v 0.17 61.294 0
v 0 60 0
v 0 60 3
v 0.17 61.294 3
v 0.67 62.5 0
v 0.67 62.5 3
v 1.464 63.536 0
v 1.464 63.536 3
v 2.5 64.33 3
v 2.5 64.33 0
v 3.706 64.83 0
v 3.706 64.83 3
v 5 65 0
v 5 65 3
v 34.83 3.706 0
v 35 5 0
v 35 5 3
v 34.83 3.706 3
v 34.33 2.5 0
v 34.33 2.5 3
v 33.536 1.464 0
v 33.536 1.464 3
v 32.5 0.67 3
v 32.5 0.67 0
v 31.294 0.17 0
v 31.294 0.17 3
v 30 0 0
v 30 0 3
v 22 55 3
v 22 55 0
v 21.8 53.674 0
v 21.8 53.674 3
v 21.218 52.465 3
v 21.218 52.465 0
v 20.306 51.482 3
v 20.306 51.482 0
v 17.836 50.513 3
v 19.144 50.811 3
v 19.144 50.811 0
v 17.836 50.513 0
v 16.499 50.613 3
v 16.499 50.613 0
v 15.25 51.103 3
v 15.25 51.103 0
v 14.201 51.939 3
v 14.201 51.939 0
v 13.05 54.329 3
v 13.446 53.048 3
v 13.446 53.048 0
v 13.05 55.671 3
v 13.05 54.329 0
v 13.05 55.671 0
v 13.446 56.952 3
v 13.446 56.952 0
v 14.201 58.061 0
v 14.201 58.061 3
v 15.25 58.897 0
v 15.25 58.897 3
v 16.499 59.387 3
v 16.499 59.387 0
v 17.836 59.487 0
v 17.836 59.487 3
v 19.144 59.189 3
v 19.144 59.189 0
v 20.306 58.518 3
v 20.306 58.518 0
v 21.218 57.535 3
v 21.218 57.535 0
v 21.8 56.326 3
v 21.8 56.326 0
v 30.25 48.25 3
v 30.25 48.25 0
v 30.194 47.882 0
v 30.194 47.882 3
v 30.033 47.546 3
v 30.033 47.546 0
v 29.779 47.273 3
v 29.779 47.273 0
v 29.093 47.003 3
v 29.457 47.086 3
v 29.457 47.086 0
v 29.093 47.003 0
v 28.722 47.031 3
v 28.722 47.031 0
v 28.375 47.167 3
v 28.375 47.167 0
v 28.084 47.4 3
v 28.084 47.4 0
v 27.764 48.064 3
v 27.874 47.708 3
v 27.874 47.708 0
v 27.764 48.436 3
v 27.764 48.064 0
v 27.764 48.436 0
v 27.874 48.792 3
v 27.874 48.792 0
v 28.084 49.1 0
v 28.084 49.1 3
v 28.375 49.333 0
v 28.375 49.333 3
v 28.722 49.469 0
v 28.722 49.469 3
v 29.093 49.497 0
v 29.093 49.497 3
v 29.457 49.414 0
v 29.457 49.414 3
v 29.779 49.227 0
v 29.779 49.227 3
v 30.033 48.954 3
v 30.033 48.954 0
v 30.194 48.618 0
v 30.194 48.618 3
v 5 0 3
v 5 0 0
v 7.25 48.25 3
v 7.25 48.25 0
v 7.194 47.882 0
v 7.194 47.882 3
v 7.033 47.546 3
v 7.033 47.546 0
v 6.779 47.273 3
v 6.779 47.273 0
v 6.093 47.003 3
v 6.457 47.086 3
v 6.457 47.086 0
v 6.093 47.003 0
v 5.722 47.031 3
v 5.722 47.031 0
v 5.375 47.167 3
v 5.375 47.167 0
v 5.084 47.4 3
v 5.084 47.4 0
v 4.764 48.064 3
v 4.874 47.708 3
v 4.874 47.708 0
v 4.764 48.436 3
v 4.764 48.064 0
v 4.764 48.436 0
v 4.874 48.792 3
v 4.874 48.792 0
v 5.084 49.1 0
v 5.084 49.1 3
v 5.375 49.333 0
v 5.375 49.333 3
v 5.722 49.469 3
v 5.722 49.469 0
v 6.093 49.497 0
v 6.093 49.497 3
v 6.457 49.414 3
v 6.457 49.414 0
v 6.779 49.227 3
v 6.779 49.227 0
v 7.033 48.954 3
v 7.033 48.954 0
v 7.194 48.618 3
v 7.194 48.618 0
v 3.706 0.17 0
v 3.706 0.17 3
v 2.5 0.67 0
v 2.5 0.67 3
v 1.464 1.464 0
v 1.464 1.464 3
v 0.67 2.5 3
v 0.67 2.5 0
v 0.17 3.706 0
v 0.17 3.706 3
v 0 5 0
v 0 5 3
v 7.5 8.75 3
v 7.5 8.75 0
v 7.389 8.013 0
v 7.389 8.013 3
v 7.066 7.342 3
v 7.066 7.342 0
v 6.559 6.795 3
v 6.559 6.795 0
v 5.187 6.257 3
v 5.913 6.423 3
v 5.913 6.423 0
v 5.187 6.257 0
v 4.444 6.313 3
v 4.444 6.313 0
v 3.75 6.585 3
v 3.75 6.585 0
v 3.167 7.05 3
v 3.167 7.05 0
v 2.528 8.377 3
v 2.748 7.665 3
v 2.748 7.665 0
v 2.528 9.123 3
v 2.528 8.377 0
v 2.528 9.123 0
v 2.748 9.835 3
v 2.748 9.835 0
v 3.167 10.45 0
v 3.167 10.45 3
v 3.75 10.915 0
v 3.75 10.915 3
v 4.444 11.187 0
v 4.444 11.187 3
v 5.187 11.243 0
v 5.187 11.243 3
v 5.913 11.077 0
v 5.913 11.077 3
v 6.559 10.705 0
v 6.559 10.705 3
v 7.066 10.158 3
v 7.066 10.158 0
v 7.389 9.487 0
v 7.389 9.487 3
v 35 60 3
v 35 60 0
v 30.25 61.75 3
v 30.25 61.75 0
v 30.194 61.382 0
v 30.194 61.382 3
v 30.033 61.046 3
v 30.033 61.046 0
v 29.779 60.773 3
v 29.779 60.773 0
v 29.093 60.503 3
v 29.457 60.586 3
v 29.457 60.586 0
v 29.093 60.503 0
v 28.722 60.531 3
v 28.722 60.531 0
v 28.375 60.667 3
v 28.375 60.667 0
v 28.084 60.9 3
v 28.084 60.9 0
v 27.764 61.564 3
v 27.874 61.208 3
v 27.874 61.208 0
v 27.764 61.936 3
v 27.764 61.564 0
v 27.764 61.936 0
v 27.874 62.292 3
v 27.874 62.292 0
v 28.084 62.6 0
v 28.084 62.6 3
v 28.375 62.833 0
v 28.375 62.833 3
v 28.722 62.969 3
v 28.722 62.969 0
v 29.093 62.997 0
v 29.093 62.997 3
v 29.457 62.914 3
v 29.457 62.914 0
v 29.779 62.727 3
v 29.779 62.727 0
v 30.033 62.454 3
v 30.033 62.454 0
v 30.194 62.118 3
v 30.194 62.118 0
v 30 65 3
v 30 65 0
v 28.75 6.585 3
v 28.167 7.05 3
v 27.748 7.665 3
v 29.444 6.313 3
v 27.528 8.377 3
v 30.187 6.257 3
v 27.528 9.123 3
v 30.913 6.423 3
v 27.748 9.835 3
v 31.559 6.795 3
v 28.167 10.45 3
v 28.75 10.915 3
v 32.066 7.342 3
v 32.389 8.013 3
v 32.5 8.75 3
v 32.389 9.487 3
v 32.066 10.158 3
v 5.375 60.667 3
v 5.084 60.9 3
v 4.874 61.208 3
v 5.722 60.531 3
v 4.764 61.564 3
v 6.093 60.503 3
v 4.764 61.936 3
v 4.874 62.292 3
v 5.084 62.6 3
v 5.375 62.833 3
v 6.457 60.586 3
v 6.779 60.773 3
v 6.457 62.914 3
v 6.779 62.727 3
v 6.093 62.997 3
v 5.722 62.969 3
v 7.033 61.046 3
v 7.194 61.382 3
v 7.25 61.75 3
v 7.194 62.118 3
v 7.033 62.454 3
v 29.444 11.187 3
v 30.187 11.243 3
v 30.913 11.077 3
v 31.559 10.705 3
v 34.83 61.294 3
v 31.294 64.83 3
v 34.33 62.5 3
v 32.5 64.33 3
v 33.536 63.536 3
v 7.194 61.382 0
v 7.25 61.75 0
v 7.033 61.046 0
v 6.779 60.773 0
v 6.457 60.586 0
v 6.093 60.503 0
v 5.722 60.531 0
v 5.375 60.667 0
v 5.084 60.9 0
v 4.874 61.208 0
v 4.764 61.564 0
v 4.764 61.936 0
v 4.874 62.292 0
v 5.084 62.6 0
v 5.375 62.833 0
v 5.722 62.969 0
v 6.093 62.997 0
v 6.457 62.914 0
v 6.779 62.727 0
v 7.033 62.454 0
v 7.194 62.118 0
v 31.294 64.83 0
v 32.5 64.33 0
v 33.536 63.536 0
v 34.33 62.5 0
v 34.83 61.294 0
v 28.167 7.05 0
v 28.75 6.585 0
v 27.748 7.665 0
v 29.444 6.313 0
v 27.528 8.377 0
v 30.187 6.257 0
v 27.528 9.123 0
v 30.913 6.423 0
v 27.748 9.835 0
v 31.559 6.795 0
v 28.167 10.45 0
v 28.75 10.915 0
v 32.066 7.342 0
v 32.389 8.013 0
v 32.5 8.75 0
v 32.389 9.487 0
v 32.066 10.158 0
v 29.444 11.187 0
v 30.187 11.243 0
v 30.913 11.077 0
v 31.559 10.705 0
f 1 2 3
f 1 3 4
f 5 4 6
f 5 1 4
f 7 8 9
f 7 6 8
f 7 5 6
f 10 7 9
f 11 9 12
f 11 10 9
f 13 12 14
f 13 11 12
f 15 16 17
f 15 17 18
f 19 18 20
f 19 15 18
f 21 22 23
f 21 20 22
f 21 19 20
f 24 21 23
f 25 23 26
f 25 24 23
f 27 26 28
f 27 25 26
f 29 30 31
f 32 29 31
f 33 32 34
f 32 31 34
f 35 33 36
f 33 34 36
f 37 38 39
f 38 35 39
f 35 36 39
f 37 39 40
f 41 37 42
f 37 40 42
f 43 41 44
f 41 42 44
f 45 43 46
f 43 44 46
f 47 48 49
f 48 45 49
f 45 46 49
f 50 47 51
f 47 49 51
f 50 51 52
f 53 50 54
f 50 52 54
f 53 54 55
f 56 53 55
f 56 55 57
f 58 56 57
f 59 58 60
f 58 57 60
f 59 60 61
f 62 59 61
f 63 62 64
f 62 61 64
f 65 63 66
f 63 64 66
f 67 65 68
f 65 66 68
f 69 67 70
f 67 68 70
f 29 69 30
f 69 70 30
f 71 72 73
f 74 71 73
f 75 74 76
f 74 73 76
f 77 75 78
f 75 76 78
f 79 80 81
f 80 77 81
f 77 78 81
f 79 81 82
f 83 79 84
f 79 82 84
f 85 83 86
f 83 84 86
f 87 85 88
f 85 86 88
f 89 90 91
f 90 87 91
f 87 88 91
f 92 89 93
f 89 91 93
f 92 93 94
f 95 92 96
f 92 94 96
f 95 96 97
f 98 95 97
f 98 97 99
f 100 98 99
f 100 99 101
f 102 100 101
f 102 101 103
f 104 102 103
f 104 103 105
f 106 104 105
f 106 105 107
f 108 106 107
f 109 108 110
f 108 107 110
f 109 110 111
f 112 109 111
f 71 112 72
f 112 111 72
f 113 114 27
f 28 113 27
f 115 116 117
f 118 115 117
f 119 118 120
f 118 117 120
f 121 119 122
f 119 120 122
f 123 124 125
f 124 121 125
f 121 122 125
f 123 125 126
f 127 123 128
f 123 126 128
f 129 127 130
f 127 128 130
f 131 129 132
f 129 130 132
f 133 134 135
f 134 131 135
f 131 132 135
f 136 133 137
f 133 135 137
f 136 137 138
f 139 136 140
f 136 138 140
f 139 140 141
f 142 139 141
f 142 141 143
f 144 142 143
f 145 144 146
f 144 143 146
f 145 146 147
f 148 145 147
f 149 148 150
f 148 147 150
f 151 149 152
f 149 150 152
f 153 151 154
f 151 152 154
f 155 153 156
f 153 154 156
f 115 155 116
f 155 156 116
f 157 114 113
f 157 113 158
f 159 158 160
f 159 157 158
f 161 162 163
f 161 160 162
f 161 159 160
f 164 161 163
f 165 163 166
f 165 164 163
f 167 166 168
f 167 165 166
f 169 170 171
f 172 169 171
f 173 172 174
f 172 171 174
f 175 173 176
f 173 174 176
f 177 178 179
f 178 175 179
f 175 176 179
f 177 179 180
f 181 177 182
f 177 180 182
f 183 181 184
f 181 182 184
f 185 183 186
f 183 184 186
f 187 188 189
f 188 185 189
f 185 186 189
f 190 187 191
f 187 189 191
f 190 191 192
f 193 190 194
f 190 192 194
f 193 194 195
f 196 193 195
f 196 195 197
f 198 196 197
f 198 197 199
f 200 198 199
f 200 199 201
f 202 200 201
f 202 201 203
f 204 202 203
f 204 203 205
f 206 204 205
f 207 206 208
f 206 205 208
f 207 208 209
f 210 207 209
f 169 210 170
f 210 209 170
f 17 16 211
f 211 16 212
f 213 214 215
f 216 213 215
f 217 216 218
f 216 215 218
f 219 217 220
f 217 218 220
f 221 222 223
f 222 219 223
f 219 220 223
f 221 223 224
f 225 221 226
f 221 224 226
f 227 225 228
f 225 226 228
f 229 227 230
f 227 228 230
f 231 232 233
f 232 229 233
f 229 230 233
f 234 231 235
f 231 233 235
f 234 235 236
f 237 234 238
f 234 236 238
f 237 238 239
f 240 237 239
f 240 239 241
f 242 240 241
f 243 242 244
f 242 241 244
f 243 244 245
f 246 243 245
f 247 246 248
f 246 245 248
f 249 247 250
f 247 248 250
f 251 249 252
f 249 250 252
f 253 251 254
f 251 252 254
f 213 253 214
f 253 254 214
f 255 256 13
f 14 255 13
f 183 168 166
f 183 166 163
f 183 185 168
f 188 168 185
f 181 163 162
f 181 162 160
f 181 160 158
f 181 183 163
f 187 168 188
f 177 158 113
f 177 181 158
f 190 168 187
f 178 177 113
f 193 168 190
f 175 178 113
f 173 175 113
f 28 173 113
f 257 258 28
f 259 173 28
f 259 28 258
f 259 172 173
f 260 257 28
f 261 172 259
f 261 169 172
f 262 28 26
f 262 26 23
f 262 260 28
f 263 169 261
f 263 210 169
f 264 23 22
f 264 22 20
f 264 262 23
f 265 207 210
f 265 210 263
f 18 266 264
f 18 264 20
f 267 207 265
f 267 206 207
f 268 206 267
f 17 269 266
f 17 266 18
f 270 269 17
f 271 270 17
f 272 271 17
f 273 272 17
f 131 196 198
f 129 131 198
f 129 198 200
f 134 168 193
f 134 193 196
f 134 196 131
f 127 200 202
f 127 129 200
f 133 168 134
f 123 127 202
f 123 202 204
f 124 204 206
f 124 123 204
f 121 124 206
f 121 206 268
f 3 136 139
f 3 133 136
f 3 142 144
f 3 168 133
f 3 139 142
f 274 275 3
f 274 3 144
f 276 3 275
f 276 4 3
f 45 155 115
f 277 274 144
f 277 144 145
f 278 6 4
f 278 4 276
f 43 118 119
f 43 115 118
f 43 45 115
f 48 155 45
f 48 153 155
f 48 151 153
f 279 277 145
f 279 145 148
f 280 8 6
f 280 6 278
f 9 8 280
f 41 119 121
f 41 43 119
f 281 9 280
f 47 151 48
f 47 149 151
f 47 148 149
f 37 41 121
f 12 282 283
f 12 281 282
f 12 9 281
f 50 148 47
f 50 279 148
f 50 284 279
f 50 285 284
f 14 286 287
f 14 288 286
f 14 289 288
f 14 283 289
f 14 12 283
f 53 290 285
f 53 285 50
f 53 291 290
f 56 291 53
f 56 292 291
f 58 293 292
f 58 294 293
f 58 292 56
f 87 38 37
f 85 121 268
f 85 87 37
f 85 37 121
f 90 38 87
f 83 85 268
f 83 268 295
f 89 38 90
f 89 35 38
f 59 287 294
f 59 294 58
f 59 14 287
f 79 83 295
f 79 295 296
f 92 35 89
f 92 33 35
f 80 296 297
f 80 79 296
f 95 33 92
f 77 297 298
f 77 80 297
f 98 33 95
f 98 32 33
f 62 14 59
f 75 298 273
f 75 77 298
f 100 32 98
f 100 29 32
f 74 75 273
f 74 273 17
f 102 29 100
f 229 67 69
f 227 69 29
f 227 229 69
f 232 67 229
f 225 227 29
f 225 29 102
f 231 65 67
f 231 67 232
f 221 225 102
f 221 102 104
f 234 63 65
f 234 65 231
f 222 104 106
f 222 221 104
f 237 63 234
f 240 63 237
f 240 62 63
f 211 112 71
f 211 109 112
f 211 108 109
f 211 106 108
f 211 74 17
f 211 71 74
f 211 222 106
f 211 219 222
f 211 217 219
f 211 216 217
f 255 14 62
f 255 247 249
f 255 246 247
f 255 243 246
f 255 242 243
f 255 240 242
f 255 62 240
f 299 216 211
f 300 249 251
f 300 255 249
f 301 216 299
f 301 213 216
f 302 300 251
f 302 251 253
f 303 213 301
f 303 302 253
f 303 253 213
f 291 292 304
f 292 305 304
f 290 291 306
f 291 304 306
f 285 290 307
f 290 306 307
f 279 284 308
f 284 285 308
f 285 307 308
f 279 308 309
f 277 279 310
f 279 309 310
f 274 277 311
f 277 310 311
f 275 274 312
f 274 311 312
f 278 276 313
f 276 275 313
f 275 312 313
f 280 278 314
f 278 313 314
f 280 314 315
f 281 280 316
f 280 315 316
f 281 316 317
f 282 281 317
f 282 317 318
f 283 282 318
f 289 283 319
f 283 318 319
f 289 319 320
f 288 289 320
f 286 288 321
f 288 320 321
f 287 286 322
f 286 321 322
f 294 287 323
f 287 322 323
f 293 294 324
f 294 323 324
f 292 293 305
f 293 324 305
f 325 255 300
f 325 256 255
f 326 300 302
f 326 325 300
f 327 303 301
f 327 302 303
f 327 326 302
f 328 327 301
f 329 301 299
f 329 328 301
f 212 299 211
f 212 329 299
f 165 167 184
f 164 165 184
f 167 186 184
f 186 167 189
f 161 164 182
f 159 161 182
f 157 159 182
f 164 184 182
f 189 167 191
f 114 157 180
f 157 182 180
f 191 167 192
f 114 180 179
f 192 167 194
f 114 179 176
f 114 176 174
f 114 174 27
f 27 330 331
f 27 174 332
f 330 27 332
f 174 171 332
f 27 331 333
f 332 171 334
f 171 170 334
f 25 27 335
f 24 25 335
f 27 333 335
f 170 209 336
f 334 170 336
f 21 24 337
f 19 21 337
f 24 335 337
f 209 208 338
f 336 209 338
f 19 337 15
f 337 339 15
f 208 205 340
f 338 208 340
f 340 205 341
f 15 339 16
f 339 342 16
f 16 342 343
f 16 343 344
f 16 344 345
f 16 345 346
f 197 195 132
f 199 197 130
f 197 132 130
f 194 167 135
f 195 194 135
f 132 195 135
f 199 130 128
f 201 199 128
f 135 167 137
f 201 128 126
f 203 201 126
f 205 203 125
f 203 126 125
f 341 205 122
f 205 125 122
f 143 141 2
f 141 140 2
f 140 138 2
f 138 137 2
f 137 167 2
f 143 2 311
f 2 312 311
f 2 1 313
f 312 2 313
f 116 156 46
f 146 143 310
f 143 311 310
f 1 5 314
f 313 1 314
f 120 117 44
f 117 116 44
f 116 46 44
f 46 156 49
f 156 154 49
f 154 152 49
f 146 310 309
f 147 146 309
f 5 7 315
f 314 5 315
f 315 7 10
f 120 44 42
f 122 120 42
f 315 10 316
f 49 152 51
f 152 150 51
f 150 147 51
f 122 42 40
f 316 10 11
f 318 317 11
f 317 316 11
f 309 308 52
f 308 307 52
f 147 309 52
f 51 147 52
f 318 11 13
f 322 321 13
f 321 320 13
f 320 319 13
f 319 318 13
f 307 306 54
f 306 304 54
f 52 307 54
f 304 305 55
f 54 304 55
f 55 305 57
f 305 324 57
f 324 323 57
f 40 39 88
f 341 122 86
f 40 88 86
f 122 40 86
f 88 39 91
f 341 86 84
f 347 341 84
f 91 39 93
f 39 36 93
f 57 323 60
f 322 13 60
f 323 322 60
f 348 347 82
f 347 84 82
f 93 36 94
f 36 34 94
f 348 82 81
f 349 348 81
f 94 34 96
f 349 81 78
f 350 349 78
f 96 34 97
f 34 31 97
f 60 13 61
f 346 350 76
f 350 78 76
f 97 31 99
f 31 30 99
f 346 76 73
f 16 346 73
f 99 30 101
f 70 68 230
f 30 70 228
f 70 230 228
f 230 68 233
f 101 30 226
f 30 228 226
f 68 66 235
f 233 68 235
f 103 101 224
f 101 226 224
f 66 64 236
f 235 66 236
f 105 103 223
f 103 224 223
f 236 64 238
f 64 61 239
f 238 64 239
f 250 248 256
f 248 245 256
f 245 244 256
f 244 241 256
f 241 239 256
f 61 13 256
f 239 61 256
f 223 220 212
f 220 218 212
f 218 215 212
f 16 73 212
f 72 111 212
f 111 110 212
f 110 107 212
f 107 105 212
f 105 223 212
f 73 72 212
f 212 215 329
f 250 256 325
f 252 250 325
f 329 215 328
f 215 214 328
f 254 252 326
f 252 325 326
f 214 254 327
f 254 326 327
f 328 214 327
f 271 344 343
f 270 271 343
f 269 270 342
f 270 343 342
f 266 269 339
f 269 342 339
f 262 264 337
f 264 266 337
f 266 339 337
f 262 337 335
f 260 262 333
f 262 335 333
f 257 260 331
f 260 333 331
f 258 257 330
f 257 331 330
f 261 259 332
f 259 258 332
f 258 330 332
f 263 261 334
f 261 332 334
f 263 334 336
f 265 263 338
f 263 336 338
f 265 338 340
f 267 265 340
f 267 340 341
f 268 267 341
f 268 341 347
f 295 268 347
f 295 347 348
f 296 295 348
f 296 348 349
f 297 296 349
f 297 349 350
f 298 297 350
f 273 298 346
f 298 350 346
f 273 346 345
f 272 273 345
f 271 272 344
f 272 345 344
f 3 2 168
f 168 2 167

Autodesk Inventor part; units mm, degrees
ref_plane "YZ Plane" through (0, 0, 0) normal (1, 0, 0) x (0, 1, 0)
ref_plane "XZ Plane" through (0, 0, 0) normal (0, 1, 0) x (-1, 0, 0)
ref_plane "XY Plane" through (0, 0, 0) normal (0, 0, 1) x (1, 0, 0)
sketch "Boceto1" plane through (0, 0, 0) normal (0, 0, 1) x (1, 0, 0)
  line L0 (5, 0) -> (30, 0)
  line L1 (35, 5) -> (35, 60)
  line L2 (30, 65) -> (5, 65)
  line L3 (0, 60) -> (0, 5)
  arc A0 (5, 65) -> (0, 60) centre (5, 60) ccw
  arc A1 (35, 60) -> (30, 65) centre (30, 60) ccw
  arc A2 (0, 5) -> (5, 0) centre (5, 5) ccw
  arc A3 (30, 0) -> (35, 5) centre (30, 5) ccw
  circle A4 centre (17.5, 55) radius 4.5
  circle A5 centre (29, 48.25) radius 1.25
  circle A6 centre (29, 61.75) radius 1.25
  circle A7 centre (6, 61.75) radius 1.25
  circle A8 centre (6, 48.25) radius 1.25
  circle A9 centre (5, 8.75) radius 2.5
  circle A10 centre (30, 8.75) radius 2.5
  point P0 (0, 0)
extrude "Extrusión1" add sketch "Boceto1" along normal blind 3
sketch "Boceto2" plane through (0, 0, 3) normal (0, 0, 1) x (1, 0, 0)
  circle A0 centre (17.5, 55) radius 4.5 projected
  circle A1 centre (29, 48.25) radius 1.25 projected
  line L0 (29, 48.25) -> (29, 55)
  circle A2 centre (29, 61.75) radius 1.25 projected
  line L1 (29, 55) -> (29, 61.75)
  circle A3 centre (6, 61.75) radius 1.25 projected
  line L2 (29, 61.75) -> (6, 61.75)
  line L3 (17.5, 55) -> (29, 55)
  point P0 (0, 0)
  dimension "d20" = 23
  dimension "d21" = 6.75
  dimension "d22" = 11.5
properties part number "5"
